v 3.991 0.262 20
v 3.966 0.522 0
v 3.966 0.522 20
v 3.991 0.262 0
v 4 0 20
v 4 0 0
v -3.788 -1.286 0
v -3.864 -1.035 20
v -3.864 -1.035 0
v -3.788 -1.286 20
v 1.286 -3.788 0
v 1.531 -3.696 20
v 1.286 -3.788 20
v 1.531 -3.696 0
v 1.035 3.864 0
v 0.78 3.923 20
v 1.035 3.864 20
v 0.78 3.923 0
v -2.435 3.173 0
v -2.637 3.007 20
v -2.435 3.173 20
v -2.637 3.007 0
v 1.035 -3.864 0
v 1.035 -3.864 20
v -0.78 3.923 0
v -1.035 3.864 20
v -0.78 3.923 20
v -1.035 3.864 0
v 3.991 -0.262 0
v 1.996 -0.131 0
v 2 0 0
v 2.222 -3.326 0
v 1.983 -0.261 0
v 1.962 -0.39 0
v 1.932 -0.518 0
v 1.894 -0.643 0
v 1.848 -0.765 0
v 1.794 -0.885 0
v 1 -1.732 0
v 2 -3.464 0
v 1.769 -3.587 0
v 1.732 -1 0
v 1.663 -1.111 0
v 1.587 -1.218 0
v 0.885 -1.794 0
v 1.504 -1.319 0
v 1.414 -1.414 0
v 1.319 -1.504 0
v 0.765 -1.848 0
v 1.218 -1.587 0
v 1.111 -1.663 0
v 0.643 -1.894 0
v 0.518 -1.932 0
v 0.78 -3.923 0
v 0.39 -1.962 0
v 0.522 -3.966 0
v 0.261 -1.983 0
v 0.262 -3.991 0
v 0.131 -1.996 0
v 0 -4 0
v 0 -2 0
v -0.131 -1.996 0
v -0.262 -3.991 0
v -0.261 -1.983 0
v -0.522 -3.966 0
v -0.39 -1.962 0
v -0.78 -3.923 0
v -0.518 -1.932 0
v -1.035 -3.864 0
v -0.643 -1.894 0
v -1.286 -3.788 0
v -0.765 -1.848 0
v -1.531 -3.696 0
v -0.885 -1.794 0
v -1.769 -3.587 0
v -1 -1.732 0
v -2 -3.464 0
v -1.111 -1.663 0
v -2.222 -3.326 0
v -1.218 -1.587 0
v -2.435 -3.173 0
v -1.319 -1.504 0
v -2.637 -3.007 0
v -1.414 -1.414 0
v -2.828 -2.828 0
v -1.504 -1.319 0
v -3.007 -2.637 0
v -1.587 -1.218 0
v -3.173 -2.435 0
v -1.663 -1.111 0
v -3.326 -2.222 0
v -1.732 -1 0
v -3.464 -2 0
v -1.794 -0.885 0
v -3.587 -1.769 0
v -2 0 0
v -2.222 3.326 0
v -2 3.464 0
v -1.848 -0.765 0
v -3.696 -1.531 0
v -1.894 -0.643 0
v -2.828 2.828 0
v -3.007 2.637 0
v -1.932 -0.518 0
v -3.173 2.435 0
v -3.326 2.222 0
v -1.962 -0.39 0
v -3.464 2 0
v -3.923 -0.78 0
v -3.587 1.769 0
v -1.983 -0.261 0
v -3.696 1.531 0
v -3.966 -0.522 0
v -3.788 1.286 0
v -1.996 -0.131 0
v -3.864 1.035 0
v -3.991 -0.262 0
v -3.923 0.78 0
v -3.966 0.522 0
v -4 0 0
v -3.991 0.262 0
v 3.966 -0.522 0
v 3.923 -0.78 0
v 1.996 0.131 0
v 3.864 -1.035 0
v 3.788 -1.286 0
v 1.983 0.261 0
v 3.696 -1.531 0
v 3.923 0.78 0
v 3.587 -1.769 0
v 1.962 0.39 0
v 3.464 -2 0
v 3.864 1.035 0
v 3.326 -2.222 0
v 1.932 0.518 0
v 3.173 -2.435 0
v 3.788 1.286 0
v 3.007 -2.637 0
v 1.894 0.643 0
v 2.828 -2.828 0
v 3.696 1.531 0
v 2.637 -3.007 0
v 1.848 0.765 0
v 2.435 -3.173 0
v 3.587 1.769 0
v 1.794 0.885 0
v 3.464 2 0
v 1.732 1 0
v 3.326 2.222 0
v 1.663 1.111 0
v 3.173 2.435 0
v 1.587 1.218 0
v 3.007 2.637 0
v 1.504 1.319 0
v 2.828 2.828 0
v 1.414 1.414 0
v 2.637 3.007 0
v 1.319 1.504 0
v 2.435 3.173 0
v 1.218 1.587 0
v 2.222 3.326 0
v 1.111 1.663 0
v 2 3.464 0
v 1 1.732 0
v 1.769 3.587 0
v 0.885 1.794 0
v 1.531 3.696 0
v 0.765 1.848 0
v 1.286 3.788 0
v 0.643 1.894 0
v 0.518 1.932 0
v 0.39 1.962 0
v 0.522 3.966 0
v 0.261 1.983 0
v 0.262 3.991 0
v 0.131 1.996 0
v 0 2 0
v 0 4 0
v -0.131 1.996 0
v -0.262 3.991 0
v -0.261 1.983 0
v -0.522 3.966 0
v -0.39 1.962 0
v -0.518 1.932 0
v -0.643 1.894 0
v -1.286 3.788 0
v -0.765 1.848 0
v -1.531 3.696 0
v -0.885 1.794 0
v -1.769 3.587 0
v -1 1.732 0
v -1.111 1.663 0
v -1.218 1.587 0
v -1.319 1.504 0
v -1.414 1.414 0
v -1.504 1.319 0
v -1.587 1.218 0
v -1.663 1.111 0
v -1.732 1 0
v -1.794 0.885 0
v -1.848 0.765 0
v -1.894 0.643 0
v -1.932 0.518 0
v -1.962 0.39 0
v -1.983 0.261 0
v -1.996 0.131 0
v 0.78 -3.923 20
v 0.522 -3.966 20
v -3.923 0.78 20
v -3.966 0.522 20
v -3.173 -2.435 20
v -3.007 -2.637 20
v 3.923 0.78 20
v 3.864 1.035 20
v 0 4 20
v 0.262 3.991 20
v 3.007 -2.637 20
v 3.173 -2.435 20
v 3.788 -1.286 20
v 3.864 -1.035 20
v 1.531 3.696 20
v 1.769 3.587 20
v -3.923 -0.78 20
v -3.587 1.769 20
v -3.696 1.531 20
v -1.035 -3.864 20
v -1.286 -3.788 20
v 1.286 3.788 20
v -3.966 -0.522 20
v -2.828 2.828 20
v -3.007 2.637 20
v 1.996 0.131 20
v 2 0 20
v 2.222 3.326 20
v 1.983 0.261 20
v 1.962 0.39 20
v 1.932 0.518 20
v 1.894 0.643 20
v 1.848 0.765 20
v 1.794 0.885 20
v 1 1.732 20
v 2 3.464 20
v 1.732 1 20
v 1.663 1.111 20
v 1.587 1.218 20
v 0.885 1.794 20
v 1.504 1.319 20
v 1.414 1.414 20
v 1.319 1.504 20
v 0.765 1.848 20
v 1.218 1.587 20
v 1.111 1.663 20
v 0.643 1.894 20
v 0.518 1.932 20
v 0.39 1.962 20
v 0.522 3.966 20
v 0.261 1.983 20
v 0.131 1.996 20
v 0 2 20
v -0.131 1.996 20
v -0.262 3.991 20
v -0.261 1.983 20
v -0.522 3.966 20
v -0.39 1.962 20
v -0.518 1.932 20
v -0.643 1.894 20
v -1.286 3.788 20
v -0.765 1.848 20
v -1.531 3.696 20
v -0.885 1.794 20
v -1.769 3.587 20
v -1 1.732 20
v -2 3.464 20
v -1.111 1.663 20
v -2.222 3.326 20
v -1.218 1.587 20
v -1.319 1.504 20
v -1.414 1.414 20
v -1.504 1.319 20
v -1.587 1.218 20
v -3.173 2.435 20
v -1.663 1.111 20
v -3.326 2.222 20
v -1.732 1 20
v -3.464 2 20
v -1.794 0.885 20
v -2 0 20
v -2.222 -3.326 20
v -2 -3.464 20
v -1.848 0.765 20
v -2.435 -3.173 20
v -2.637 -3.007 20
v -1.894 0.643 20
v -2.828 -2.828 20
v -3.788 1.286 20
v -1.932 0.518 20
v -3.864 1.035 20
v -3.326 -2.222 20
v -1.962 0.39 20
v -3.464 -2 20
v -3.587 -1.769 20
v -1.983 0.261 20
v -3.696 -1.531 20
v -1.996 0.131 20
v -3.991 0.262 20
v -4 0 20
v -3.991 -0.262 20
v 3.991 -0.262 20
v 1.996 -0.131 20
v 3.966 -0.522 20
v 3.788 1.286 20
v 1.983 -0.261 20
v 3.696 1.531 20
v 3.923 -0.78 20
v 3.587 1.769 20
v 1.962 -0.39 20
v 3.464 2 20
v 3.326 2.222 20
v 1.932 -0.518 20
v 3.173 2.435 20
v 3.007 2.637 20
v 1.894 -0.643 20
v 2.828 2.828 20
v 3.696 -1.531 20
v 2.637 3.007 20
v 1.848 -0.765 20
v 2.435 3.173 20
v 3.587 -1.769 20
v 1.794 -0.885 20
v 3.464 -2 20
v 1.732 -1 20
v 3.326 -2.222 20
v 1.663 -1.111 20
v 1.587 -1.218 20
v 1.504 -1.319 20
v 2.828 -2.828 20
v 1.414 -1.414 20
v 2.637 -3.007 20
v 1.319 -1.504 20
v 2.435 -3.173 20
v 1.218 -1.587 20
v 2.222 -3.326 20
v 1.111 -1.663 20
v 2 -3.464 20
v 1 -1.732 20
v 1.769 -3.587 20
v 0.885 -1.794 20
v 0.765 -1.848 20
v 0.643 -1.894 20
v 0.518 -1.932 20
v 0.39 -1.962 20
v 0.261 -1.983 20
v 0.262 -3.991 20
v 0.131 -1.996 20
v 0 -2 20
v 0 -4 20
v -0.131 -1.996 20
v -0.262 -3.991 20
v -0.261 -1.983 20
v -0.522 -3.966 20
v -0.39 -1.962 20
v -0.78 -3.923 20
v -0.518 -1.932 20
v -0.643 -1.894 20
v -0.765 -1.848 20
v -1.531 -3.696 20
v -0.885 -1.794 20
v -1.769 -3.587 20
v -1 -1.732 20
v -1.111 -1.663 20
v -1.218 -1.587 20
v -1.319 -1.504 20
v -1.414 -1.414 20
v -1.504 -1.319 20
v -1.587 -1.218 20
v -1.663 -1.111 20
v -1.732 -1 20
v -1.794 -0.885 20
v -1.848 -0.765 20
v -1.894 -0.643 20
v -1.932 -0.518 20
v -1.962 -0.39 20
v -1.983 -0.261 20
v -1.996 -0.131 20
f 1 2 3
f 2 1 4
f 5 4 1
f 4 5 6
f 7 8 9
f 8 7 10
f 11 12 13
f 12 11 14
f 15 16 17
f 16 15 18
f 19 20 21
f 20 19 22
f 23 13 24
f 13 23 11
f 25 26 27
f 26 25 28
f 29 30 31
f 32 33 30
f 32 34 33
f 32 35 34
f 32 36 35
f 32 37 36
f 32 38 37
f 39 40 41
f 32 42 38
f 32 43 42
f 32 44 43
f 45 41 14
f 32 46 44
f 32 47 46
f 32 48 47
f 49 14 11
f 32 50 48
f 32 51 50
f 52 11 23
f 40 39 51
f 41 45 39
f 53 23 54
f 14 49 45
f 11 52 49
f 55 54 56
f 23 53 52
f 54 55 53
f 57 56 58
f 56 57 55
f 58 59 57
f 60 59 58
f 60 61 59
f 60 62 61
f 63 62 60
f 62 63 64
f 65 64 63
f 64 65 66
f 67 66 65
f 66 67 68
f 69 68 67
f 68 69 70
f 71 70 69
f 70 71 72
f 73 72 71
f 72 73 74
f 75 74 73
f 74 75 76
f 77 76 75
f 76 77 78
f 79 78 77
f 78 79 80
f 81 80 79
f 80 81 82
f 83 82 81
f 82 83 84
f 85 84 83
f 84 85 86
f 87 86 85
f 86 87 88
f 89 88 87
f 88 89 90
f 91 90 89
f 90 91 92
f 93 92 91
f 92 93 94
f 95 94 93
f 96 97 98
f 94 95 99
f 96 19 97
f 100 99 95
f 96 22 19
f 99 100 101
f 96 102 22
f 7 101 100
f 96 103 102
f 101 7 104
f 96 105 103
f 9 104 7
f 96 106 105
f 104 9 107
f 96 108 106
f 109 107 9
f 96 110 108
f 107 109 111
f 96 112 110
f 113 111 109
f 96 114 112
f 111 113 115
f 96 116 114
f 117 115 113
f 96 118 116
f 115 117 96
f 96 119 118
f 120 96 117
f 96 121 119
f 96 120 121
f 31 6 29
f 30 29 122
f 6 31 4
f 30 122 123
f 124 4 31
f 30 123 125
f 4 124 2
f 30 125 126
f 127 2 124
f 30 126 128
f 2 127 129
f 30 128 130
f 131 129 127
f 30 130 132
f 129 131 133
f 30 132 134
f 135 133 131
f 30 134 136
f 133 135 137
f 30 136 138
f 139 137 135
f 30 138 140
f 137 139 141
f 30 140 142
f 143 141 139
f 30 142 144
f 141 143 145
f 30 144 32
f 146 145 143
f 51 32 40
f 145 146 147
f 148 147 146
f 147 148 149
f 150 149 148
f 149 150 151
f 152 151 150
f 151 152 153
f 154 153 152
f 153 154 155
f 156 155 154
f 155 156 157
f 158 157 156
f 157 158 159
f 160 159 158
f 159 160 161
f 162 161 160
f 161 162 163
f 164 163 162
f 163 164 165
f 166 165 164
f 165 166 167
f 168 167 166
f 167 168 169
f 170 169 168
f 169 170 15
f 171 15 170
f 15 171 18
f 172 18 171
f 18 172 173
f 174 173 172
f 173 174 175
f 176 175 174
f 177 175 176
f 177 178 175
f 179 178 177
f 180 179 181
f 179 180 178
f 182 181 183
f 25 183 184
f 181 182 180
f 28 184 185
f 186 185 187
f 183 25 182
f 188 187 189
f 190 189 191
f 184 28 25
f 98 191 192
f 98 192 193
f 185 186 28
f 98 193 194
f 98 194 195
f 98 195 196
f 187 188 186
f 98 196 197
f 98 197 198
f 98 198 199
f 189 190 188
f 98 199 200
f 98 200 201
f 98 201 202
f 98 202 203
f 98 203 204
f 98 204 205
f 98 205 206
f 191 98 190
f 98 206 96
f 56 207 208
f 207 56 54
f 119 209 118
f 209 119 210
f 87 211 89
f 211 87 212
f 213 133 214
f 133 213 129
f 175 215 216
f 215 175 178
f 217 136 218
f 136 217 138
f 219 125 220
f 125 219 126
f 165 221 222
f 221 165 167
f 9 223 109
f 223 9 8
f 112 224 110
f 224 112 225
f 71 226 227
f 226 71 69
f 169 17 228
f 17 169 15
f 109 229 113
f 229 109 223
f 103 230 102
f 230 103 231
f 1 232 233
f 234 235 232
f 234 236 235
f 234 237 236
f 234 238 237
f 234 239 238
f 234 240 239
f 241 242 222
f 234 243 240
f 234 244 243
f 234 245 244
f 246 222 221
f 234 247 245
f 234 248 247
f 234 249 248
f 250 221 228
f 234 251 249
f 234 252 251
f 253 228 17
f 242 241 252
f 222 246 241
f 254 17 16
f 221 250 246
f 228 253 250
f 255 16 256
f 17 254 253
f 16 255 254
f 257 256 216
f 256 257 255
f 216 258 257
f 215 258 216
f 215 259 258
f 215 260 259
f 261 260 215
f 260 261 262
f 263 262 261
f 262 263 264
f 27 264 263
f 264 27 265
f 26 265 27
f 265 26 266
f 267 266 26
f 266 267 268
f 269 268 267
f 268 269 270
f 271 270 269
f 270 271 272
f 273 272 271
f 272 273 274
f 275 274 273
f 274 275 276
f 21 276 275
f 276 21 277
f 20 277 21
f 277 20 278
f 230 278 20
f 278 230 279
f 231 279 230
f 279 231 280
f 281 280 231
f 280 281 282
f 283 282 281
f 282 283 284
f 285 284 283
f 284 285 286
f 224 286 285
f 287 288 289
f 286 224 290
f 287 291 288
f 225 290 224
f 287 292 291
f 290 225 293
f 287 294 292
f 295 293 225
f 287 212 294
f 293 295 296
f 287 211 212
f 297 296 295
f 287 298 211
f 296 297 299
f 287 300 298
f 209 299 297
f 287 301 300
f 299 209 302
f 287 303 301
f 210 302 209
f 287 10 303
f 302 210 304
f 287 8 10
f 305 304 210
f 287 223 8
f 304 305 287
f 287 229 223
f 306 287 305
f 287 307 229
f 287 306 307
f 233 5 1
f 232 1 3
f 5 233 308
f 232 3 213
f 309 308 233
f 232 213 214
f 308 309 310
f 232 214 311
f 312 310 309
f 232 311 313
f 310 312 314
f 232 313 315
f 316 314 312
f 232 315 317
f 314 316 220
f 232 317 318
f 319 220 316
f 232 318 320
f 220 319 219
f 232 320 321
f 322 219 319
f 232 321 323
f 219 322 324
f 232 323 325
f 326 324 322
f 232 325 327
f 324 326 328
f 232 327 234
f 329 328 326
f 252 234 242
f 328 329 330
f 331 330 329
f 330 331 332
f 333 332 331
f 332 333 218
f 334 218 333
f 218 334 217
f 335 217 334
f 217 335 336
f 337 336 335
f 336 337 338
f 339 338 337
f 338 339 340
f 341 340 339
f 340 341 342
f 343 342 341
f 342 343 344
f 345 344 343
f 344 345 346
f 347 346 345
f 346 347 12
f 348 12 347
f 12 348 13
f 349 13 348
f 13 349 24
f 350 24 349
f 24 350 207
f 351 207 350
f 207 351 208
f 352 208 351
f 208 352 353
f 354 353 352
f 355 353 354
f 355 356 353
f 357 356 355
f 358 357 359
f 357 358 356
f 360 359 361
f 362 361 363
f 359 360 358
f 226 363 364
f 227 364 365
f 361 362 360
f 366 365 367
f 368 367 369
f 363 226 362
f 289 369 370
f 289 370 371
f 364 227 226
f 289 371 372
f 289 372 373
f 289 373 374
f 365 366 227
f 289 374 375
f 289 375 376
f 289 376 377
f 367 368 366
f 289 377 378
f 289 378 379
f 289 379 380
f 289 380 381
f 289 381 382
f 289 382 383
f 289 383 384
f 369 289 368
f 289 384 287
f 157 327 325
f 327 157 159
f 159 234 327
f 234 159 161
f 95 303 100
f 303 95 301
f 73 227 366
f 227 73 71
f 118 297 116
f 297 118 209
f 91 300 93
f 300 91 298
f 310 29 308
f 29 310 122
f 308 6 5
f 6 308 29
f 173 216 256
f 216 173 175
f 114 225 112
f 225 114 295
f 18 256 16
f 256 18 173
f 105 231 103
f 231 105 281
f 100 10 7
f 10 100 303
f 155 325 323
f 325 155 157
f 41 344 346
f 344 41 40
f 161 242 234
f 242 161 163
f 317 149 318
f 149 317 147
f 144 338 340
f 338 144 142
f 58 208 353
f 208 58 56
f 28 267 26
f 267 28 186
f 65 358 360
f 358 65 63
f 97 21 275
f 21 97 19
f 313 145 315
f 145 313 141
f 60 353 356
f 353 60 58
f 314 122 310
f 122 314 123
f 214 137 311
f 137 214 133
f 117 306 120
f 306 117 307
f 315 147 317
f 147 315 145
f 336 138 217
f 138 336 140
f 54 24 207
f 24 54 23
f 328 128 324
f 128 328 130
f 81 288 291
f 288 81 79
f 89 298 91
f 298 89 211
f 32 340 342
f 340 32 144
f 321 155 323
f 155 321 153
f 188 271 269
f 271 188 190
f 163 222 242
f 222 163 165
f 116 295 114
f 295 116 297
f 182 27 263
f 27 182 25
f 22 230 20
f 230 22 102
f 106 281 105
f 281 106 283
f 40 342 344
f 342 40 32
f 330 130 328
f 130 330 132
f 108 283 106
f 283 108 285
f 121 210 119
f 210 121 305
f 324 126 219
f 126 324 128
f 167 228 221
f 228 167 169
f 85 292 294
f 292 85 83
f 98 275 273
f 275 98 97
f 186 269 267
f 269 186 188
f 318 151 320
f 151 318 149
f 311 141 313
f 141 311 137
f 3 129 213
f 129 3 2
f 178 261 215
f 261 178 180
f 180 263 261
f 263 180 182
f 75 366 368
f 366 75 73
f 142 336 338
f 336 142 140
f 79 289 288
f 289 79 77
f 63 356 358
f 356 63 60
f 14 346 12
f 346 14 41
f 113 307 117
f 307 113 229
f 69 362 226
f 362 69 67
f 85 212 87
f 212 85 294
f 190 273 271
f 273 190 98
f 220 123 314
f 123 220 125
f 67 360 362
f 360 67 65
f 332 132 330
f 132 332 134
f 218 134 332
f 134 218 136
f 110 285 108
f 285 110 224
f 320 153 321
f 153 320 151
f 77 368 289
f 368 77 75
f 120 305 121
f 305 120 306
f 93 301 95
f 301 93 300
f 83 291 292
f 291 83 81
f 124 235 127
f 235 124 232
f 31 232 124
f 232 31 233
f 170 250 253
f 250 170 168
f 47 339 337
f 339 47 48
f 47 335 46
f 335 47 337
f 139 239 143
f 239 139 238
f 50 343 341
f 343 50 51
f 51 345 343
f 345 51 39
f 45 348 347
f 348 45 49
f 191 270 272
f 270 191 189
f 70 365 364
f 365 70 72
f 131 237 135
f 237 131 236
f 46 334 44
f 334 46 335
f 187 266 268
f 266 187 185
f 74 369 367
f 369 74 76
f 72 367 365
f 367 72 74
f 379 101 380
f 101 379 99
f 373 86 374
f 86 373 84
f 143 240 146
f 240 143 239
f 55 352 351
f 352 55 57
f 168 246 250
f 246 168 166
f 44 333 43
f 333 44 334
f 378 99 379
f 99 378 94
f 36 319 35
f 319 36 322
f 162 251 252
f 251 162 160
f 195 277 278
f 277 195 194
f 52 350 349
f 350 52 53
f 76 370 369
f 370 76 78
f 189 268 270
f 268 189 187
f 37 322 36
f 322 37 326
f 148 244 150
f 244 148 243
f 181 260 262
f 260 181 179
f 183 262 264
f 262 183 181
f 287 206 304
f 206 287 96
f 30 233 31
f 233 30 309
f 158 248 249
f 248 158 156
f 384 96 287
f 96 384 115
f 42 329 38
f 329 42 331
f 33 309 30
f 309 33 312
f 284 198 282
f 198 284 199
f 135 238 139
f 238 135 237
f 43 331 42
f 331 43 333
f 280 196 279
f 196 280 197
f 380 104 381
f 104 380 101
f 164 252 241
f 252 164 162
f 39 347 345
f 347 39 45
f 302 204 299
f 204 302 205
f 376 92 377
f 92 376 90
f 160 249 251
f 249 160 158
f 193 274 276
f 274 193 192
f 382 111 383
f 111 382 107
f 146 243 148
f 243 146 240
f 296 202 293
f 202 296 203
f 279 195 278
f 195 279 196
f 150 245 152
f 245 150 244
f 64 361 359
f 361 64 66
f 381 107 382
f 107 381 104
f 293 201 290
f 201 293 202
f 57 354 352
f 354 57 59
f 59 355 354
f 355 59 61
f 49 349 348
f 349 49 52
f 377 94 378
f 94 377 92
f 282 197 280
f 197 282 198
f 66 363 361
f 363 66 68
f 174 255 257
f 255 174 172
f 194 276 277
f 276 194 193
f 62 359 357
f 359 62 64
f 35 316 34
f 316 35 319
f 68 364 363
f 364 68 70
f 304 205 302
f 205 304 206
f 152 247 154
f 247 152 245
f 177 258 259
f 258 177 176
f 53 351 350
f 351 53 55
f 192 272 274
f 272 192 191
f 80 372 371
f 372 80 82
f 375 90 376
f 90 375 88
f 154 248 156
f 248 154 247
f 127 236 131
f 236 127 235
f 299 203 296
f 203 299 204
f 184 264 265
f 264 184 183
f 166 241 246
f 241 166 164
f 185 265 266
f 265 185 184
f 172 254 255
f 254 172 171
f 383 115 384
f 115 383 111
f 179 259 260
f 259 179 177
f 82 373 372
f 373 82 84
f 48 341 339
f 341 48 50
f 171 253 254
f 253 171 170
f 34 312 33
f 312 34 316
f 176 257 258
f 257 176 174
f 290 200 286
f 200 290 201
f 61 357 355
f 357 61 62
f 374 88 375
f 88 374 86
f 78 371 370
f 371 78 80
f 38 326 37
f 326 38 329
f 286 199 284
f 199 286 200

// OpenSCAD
$fn = 96;

thread_d = 4.0;      // nominal thread diameter (mm)
length   = 20.0;     // overall length (mm)
outer_d  = 8.0;      // pillar diameter (mm)

difference() {
  cylinder(d = outer_d, h = length);
  translate([0, 0, -0.2])
    cylinder(d = thread_d, h = length + 0.4);
}
